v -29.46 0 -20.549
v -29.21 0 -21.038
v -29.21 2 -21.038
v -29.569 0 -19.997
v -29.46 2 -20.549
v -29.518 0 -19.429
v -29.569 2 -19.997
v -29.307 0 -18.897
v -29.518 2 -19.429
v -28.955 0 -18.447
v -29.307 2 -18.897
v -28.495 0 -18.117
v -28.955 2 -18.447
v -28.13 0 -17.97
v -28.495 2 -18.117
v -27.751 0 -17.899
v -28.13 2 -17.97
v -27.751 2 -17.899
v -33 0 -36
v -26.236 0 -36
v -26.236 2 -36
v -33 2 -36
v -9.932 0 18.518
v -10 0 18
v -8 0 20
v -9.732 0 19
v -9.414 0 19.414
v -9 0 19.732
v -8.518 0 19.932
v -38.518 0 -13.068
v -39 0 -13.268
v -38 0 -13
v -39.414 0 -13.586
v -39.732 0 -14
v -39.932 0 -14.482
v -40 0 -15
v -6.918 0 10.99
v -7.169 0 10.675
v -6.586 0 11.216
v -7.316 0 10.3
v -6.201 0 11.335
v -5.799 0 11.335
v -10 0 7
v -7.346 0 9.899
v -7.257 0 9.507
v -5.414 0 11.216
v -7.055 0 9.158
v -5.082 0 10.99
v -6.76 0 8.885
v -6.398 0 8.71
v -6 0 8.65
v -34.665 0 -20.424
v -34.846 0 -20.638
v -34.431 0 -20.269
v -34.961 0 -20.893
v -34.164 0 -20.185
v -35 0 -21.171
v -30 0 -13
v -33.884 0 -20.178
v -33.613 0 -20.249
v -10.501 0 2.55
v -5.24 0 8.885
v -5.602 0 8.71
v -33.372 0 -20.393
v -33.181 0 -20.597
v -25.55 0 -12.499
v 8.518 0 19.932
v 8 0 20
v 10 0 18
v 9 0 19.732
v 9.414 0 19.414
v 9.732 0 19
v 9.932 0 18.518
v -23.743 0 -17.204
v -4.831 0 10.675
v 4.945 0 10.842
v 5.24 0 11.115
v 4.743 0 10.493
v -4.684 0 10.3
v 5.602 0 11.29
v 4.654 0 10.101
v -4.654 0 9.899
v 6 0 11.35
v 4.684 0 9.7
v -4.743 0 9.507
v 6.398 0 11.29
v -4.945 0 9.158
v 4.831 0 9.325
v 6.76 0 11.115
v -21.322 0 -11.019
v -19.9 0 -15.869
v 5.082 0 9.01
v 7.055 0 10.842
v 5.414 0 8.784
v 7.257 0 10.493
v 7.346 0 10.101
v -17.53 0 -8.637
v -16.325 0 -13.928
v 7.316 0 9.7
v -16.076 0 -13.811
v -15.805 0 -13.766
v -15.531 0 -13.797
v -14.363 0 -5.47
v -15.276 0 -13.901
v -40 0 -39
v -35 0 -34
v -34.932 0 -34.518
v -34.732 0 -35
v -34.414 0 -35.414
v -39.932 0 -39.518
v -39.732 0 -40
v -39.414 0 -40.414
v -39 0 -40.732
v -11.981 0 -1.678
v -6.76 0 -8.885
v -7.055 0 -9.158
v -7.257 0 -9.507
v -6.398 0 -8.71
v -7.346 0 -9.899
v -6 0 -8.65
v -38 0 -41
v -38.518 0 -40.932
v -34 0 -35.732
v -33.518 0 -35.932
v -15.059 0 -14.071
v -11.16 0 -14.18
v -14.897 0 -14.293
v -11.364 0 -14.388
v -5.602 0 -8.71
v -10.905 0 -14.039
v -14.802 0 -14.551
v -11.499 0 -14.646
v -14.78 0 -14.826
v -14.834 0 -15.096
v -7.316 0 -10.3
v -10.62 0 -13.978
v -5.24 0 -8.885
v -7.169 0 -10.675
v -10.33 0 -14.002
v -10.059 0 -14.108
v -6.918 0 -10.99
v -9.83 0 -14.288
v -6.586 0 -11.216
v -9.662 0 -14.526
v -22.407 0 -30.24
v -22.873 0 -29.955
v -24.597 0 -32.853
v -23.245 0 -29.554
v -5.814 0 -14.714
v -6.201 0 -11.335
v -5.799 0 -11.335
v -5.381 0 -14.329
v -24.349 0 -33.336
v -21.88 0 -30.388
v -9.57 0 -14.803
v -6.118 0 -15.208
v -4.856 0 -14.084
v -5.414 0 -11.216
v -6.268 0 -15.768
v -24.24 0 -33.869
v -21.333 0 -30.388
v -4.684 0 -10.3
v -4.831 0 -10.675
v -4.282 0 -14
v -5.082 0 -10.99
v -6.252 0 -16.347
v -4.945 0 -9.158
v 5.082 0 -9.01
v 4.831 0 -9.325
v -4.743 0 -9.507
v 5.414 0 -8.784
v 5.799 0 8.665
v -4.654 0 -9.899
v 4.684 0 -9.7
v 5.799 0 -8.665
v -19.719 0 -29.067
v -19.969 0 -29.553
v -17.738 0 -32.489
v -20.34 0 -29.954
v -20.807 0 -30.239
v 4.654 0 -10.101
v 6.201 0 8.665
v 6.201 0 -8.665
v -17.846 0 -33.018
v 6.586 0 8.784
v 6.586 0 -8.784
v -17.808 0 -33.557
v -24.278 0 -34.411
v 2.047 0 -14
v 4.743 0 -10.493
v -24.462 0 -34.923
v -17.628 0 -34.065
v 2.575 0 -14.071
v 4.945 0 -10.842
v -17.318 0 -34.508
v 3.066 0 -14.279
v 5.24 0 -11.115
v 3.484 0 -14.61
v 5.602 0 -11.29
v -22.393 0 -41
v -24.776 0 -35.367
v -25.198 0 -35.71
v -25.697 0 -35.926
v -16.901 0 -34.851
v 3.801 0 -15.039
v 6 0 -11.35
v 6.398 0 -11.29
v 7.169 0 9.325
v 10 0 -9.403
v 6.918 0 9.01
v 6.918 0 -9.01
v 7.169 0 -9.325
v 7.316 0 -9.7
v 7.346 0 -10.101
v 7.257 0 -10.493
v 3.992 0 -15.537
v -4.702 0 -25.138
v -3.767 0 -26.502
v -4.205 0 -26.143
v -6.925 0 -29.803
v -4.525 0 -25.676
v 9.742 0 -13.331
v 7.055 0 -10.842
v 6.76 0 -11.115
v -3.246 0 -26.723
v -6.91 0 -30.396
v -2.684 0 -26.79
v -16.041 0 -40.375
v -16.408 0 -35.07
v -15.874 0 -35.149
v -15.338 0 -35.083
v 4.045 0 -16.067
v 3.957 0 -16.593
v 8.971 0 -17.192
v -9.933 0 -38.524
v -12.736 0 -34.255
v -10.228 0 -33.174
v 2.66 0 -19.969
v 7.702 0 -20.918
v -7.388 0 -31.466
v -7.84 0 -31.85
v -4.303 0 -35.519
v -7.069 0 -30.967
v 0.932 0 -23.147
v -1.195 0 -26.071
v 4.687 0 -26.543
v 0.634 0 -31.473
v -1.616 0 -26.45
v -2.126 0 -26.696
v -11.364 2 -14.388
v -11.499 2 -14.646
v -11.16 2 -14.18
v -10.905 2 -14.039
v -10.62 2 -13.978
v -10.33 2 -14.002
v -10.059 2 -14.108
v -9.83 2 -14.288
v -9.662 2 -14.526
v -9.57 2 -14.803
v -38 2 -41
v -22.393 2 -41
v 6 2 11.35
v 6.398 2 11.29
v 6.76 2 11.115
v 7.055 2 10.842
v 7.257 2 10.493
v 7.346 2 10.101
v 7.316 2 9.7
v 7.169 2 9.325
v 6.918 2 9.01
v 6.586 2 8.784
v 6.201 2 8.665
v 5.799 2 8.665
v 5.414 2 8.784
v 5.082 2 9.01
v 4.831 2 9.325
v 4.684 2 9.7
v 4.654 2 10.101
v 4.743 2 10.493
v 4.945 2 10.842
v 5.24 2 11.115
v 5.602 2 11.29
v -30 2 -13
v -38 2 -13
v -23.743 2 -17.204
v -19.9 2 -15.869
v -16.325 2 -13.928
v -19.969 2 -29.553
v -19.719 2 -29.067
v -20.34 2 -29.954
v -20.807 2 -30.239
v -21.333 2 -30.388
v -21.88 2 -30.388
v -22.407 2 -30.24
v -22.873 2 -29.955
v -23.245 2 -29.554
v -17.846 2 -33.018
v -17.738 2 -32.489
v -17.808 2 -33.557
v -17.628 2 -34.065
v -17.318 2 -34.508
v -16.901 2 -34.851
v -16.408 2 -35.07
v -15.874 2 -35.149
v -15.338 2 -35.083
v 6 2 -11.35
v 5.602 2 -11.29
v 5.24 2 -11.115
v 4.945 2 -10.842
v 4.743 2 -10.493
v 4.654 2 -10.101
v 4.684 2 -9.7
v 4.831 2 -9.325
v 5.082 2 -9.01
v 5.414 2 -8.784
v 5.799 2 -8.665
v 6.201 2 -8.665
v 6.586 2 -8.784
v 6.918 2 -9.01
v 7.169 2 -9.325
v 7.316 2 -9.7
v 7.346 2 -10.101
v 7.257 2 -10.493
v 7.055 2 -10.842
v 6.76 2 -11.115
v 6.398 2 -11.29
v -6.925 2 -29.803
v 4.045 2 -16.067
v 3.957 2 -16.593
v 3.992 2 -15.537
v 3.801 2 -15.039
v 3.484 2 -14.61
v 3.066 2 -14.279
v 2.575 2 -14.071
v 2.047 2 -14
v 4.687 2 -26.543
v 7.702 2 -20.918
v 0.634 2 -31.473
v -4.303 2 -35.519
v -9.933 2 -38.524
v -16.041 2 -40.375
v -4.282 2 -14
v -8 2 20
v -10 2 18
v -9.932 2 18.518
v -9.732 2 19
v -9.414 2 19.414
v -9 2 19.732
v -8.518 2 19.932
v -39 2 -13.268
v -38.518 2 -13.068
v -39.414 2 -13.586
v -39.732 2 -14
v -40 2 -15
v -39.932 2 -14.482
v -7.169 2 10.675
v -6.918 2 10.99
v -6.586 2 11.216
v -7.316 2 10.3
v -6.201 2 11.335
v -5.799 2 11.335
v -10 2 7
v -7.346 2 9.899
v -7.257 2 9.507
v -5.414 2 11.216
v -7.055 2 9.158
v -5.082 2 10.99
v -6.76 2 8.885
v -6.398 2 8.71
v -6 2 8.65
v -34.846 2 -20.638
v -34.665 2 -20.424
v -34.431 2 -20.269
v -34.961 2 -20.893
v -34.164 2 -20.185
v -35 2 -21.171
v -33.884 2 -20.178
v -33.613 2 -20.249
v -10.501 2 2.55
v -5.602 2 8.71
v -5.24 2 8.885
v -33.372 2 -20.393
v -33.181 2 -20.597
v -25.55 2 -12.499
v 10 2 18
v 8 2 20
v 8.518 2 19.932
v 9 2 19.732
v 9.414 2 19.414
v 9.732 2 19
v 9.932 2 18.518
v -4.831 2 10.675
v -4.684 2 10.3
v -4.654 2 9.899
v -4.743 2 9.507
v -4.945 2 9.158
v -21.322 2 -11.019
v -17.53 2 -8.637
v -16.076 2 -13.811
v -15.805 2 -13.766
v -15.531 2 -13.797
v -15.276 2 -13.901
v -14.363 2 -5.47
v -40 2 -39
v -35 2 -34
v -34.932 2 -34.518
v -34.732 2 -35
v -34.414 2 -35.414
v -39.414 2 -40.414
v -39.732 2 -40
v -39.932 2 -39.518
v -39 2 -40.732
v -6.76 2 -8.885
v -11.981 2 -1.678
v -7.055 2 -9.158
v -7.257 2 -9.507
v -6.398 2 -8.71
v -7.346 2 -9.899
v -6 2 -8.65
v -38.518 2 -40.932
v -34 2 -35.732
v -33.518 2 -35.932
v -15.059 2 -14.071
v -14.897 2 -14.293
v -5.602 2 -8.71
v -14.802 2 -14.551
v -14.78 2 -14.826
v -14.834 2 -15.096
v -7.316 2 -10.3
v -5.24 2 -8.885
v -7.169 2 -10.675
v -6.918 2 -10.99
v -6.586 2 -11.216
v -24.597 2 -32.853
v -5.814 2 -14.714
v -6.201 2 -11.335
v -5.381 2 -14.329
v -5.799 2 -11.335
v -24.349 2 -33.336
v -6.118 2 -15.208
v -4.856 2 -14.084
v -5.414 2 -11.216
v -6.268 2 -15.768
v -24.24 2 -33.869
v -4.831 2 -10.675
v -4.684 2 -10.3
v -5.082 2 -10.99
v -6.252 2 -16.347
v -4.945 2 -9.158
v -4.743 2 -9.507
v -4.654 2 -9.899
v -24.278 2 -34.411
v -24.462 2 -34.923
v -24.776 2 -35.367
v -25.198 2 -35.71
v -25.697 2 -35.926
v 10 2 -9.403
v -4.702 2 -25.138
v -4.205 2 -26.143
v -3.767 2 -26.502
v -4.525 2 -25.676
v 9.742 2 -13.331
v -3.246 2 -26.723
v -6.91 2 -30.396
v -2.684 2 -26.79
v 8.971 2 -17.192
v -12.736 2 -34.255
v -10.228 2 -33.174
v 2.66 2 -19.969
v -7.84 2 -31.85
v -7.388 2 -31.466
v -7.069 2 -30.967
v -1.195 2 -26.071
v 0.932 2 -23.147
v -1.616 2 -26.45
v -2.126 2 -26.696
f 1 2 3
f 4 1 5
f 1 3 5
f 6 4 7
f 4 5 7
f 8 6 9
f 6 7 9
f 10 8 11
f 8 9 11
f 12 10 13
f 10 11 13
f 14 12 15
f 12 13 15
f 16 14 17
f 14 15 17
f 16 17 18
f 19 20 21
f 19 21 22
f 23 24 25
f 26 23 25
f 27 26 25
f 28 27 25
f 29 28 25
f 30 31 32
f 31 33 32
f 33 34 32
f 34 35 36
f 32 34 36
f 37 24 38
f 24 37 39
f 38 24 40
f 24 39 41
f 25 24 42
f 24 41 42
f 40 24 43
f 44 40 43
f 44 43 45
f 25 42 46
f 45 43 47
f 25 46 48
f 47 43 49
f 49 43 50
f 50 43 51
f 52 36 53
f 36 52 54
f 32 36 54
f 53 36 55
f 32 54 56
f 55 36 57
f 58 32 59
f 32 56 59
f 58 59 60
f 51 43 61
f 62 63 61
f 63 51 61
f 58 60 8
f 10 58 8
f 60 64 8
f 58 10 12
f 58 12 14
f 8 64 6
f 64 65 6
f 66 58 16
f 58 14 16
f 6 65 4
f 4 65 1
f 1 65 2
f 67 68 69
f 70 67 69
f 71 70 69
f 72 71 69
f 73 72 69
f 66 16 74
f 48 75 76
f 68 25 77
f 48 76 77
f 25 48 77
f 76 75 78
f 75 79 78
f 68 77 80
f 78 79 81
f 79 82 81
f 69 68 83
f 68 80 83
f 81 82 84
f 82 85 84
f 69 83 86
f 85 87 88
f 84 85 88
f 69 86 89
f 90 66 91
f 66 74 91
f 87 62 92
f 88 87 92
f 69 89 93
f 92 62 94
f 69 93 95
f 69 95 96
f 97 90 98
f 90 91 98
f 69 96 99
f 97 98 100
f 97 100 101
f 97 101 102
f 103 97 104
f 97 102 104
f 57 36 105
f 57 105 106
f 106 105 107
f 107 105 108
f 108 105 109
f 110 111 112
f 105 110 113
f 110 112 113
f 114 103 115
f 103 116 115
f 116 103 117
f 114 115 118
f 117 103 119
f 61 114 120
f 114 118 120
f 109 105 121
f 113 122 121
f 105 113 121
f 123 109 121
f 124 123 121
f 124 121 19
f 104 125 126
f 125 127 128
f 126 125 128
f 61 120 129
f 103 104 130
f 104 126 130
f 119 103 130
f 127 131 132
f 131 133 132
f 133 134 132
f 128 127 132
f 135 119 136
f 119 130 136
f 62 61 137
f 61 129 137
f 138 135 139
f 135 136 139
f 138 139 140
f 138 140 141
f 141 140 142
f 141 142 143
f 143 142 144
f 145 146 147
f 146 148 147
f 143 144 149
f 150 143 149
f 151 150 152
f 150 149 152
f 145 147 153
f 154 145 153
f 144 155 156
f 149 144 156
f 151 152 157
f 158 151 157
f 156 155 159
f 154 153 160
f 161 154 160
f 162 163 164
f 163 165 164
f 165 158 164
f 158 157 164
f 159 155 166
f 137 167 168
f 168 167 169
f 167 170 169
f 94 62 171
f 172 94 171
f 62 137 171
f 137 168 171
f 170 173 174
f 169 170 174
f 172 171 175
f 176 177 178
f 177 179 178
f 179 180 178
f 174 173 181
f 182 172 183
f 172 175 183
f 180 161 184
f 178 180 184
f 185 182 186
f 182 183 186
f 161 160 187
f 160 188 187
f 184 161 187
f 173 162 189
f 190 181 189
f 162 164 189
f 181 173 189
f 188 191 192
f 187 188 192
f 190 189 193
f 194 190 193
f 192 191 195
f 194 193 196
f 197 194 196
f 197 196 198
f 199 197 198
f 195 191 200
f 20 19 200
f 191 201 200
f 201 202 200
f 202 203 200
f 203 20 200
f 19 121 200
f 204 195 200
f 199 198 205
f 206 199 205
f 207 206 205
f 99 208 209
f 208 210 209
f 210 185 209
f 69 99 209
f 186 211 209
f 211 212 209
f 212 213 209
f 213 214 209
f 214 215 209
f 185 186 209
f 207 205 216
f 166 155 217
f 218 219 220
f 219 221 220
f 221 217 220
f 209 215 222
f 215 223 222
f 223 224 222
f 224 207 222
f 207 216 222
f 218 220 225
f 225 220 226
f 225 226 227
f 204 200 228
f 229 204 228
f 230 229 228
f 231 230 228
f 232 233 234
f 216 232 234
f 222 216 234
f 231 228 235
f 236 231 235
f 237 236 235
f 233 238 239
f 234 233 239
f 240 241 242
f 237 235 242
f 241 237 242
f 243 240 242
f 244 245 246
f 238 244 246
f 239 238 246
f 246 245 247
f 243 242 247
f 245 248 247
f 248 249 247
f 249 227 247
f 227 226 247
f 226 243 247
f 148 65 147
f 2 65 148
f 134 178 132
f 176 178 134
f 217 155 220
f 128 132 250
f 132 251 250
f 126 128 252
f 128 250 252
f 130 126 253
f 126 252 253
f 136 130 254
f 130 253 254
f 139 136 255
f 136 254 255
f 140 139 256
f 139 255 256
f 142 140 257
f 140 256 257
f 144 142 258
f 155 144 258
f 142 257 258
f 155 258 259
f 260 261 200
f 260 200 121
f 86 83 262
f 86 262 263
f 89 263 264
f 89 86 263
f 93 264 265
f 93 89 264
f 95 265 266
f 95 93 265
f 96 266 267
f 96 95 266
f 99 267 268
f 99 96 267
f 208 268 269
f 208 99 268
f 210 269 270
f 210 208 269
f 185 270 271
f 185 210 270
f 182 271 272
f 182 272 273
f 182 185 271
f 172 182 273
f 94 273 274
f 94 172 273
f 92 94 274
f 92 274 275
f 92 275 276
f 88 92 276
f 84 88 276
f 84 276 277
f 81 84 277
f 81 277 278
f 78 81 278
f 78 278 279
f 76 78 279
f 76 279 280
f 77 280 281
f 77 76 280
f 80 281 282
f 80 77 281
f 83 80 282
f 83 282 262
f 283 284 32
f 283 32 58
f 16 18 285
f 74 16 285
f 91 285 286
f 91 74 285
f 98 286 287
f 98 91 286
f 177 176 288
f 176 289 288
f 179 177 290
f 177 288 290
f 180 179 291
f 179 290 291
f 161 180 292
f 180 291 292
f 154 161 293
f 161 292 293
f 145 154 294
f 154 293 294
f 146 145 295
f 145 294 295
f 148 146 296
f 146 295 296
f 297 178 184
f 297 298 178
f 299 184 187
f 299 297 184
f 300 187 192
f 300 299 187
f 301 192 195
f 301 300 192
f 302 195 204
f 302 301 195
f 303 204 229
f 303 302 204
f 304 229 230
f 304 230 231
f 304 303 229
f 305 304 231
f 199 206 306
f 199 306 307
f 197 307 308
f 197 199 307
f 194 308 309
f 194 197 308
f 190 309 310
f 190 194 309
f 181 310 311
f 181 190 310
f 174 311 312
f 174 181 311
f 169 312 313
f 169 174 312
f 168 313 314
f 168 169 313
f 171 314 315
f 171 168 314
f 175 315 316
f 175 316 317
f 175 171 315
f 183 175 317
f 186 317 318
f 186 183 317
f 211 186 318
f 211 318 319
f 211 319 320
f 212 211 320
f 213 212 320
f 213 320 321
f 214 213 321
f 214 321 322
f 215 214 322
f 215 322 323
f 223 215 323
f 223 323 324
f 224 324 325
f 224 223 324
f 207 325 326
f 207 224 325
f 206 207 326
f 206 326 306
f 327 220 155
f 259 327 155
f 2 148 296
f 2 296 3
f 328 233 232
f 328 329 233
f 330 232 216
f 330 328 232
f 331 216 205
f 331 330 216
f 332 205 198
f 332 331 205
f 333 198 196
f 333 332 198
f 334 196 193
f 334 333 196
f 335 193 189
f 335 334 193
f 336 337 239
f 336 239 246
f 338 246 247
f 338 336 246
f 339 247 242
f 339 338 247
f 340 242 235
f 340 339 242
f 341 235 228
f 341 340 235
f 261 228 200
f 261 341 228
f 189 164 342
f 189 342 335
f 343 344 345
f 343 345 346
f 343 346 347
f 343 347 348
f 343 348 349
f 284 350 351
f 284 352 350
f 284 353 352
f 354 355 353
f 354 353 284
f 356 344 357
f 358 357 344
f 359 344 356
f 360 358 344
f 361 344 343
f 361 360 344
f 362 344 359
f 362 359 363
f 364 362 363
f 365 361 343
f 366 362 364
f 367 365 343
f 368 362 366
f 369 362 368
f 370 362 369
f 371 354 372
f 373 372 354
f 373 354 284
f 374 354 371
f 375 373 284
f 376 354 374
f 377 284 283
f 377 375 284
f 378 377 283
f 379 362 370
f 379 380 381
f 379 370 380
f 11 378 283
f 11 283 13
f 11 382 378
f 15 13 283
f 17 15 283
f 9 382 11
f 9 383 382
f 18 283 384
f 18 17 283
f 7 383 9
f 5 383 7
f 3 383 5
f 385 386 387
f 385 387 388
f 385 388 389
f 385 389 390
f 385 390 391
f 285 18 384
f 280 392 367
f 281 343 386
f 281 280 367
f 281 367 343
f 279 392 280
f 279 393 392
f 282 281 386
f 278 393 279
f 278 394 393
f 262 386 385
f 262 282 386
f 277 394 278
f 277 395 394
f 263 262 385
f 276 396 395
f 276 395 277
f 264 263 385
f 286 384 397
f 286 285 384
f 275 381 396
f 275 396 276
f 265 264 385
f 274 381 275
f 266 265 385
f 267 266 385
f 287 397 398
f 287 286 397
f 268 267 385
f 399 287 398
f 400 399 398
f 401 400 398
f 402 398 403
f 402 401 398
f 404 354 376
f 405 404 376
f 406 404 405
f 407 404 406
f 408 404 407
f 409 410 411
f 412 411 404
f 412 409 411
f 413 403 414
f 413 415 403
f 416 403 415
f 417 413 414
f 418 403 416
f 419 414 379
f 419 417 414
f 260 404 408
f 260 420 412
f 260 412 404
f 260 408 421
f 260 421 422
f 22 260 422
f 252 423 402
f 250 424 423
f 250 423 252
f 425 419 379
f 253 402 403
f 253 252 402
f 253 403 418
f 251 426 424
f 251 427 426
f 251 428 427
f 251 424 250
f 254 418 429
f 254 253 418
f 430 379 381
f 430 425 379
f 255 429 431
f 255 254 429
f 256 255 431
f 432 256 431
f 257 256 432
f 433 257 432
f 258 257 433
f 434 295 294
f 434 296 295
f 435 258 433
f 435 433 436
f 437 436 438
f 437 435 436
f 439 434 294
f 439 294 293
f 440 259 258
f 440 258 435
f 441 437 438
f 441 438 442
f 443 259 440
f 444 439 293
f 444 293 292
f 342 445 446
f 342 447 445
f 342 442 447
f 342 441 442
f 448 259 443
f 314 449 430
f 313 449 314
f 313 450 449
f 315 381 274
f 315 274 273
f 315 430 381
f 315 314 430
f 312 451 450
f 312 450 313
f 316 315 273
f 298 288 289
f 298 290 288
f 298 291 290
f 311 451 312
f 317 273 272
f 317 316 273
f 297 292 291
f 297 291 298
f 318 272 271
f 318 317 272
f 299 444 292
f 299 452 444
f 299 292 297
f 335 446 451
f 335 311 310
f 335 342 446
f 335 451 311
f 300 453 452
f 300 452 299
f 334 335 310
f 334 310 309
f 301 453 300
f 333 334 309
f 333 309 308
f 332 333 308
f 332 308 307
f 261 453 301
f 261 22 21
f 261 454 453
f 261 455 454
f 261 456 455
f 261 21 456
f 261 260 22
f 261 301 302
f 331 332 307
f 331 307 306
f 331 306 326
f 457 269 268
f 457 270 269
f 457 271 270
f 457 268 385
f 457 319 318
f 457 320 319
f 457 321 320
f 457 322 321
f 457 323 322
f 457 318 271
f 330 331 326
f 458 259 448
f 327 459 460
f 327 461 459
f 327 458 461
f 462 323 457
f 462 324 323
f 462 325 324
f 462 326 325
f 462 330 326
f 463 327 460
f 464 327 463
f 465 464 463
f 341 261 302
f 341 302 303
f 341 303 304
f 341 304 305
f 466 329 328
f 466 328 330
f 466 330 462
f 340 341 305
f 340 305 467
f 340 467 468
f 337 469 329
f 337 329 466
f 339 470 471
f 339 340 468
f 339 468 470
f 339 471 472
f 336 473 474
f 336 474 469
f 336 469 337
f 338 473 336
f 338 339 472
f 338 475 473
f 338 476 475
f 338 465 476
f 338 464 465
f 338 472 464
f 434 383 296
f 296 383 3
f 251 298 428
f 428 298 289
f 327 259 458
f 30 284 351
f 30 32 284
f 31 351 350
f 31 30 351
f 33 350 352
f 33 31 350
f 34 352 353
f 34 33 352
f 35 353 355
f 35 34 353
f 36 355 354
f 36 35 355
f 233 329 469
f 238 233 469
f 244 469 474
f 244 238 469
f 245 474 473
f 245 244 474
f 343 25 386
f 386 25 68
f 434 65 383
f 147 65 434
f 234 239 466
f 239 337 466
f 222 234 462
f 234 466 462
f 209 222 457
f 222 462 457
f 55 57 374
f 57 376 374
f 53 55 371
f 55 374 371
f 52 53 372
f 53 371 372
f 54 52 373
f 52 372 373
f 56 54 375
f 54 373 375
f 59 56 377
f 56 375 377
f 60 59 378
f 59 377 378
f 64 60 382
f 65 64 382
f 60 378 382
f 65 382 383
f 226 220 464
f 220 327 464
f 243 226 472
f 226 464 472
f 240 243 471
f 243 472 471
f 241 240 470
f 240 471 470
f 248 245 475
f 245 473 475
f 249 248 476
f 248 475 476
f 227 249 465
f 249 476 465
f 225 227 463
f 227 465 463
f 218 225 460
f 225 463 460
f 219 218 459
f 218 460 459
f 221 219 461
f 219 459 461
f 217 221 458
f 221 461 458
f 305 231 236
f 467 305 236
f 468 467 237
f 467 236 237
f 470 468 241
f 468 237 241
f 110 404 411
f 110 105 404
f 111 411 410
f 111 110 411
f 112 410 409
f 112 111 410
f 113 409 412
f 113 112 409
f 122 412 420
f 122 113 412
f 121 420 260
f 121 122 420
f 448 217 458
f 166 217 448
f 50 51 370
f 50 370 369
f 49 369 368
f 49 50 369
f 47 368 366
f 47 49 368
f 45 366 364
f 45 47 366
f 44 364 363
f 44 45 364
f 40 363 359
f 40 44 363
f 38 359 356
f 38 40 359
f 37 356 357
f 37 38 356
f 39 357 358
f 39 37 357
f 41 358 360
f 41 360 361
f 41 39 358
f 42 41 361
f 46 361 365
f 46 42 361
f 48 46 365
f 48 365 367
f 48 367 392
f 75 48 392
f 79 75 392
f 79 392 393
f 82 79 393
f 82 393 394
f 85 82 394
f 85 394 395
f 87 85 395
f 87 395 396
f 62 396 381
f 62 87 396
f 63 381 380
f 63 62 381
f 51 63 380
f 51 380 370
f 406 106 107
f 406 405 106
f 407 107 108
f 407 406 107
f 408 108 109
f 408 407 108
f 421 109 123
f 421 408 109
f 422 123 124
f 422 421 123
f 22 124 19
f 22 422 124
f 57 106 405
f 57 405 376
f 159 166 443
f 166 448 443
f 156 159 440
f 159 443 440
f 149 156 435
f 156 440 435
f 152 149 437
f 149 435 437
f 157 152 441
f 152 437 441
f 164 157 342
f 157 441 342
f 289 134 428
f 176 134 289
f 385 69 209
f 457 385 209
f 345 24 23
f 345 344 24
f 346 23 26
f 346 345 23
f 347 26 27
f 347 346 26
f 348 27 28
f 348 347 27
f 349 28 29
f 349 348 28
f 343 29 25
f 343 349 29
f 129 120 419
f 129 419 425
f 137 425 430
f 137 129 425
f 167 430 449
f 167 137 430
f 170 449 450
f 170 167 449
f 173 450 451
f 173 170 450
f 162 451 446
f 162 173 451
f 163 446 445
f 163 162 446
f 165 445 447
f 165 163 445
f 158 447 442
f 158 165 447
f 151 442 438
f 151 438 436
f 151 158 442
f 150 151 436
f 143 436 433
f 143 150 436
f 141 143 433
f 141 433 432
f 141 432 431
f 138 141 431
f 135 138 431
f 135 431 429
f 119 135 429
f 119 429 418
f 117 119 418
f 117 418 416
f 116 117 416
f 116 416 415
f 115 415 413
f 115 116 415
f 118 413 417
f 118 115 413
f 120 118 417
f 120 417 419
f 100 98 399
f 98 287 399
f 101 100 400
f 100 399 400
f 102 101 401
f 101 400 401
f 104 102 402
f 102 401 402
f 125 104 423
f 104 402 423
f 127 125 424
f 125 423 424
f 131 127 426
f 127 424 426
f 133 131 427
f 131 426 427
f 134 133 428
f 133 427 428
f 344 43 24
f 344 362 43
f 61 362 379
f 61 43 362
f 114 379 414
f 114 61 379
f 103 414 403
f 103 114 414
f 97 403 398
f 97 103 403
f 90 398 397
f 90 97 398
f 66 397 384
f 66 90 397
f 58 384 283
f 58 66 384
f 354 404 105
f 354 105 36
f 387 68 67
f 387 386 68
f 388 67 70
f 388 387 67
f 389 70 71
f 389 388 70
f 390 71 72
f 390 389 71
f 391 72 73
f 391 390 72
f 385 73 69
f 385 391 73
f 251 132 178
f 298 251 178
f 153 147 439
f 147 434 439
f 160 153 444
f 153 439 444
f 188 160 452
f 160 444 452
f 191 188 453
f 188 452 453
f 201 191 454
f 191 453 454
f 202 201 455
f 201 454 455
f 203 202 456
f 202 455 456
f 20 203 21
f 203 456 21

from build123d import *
from OCP.BRepFilletAPI import BRepFilletAPI_MakeFillet

# Parameters (mm, degrees)
SKETCH_1_W               = 20
SKETCH_1_H               = 32
SKETCH_1_R               = 1.35
EXTRUDE_1_DEPTH          = 2
EXTRUDE_2_DEPTH          = 2
FILLET_1_R               = 20
CUT_EXTRUDE_2_DEPTH      = 58.314919524
CUT_EXTRUDE_2_DEPTH_BACK = 58.314919524
FILLET_2_R1              = 2
FILLET_2_R2              = 1
FILLET_5_R               = 2
FILLET_6_R               = 30


with BuildPart() as part:
    # 草图1 → 凸台-拉伸1 (new body)
    with BuildSketch(Plane(origin=(0, 0, 0), x_dir=(1, 0, 0), z_dir=(0, 1, 0))):
        with Locations((0, -4)):
            Rectangle(SKETCH_1_W, SKETCH_1_H)
        with Locations(Location((-6, 10, 0), (0, 0, 270))):
            Circle(SKETCH_1_R, mode=Mode.SUBTRACT)
        with Locations(Location((6, 10, 0), (0, 0, 90))):
            Circle(SKETCH_1_R, mode=Mode.SUBTRACT)
        with Locations(Location((6, -10, 0), (0, 0, 270))):
            Circle(SKETCH_1_R, mode=Mode.SUBTRACT)
        with Locations(Location((-6, -10, 0), (0, 0, 90))):
            Circle(SKETCH_1_R, mode=Mode.SUBTRACT)
    extrude(amount=EXTRUDE_1_DEPTH)

    # 草图2 → 凸台-拉伸2 (add)
    with BuildSketch(Plane(origin=(0, 2, 0), x_dir=(1, 0, 0), z_dir=(0, 1, 0))):
        with BuildLine():
            Line((-40, 41), (-40, 13))
            Line((-40, 13), (-10, 13))
            Line((-10, 13), (-10, 12))
            Line((-10, 12), (10, 12))
            ThreePointArc((10, 12), (-0.654211509, 32.690782604), (-22.393061845, 41))
            Line((-22.393061845, 41), (-40, 41))
        make_face()
    extrude(amount=-EXTRUDE_2_DEPTH)

    # 圆角1
    fillet_1_edges = [part.edges().sort_by_distance(p)[0] for p in [
        (-10, 1, -13),
    ]]
    fillet(fillet_1_edges, radius=FILLET_1_R)

    # 草图3 → 切除-拉伸2 (cut, two sides: drawn at the far end of the back side and taken through both)
    with BuildSketch(Plane(origin=(0, 2, 0), x_dir=(1, 0, 0), z_dir=(0, 1, 0)).offset(-CUT_EXTRUDE_2_DEPTH_BACK)):
        Polygon((-22.393061845, 36), (-35, 36), (-35, 18), align=None)
        with BuildLine():
            Line((-31.337370064, 18), (-30, 18))
            ThreePointArc((-30, 18), (-21.339745962, 16.452078799), (-13.751923191, 12))
            Line((-13.751923191, 12), (-21.0069112, 32.749676509))
            Line((-21.0069112, 32.749676509), (-31.337370064, 18))
        make_face()
        with BuildLine():
            Line((-10.235217527, 11.031539438), (-18.887076306, 35.776345445))
            ThreePointArc((-18.887076306, 35.776345445), (-12.511241297, 34.169724991), (-6.696576783, 31.100168357))
            Line((-6.696576783, 31.100168357), (-10.235217527, 11.031539438))
        make_face()
        with BuildLine():
            Line((-6.665518003, 14), (4.625979988, 14))
            ThreePointArc((4.625979988, 14), (1.508463055, 22.192897882), (-4.021593898, 28.994438709))
            Line((-4.021593898, 28.994438709), (-6.665518003, 14))
        make_face()
    extrude(amount=CUT_EXTRUDE_2_DEPTH + CUT_EXTRUDE_2_DEPTH_BACK, mode=Mode.SUBTRACT)

    # 圆角2: one fillet with a radius per group of edges: ONE call of the kernel's fillet builder (fillet() takes one radius for all edges)
    fillet_2_edges_1 = [part.edges().sort_by_distance(p)[0] for p in [
        (-31.337370064, 1, -18),
        (-22.393061845, 1, -36),
        (-35, 1, -36),
        (-21.0069112, 1, -32.749676509),
        (-4.021593898, 1, -28.994438709),
        (-6.696576783, 1, -31.100168357),
        (-18.887076306, 1, -35.776345445),
        (4.625979988, 1, -14),
        (-6.665518003, 1, -14),
    ]]
    fillet_2_edges_2 = [part.edges().sort_by_distance(p)[0] for p in [
        (-35, 1, -18),
        (-13.751923191, 1, -12),
        (-10.235217527, 1, -11.031539438),
    ]]
    fillet_2 = BRepFilletAPI_MakeFillet(part.part.solid().wrapped)
    for e in fillet_2_edges_1:
        fillet_2.Add(FILLET_2_R1, e.wrapped)
    for e in fillet_2_edges_2:
        fillet_2.Add(FILLET_2_R2, e.wrapped)
    add(Compound.cast(fillet_2.Shape()), mode=Mode.REPLACE)

    # 圆角5
    fillet_5_edges = [part.edges().sort_by_distance(p)[0] for p in [
        (-40, 1, -13),
        (-40, 1, -41),
        (10, 1, 20),
        (-10, 1, 20),
    ]]
    fillet(fillet_5_edges, radius=FILLET_5_R)

    # 圆角6
    fillet_6_edges = [part.edges().sort_by_distance(p)[0] for p in [
        (10, 1, -12),
    ]]
    fillet(fillet_6_edges, radius=FILLET_6_R)


solid = part.part
